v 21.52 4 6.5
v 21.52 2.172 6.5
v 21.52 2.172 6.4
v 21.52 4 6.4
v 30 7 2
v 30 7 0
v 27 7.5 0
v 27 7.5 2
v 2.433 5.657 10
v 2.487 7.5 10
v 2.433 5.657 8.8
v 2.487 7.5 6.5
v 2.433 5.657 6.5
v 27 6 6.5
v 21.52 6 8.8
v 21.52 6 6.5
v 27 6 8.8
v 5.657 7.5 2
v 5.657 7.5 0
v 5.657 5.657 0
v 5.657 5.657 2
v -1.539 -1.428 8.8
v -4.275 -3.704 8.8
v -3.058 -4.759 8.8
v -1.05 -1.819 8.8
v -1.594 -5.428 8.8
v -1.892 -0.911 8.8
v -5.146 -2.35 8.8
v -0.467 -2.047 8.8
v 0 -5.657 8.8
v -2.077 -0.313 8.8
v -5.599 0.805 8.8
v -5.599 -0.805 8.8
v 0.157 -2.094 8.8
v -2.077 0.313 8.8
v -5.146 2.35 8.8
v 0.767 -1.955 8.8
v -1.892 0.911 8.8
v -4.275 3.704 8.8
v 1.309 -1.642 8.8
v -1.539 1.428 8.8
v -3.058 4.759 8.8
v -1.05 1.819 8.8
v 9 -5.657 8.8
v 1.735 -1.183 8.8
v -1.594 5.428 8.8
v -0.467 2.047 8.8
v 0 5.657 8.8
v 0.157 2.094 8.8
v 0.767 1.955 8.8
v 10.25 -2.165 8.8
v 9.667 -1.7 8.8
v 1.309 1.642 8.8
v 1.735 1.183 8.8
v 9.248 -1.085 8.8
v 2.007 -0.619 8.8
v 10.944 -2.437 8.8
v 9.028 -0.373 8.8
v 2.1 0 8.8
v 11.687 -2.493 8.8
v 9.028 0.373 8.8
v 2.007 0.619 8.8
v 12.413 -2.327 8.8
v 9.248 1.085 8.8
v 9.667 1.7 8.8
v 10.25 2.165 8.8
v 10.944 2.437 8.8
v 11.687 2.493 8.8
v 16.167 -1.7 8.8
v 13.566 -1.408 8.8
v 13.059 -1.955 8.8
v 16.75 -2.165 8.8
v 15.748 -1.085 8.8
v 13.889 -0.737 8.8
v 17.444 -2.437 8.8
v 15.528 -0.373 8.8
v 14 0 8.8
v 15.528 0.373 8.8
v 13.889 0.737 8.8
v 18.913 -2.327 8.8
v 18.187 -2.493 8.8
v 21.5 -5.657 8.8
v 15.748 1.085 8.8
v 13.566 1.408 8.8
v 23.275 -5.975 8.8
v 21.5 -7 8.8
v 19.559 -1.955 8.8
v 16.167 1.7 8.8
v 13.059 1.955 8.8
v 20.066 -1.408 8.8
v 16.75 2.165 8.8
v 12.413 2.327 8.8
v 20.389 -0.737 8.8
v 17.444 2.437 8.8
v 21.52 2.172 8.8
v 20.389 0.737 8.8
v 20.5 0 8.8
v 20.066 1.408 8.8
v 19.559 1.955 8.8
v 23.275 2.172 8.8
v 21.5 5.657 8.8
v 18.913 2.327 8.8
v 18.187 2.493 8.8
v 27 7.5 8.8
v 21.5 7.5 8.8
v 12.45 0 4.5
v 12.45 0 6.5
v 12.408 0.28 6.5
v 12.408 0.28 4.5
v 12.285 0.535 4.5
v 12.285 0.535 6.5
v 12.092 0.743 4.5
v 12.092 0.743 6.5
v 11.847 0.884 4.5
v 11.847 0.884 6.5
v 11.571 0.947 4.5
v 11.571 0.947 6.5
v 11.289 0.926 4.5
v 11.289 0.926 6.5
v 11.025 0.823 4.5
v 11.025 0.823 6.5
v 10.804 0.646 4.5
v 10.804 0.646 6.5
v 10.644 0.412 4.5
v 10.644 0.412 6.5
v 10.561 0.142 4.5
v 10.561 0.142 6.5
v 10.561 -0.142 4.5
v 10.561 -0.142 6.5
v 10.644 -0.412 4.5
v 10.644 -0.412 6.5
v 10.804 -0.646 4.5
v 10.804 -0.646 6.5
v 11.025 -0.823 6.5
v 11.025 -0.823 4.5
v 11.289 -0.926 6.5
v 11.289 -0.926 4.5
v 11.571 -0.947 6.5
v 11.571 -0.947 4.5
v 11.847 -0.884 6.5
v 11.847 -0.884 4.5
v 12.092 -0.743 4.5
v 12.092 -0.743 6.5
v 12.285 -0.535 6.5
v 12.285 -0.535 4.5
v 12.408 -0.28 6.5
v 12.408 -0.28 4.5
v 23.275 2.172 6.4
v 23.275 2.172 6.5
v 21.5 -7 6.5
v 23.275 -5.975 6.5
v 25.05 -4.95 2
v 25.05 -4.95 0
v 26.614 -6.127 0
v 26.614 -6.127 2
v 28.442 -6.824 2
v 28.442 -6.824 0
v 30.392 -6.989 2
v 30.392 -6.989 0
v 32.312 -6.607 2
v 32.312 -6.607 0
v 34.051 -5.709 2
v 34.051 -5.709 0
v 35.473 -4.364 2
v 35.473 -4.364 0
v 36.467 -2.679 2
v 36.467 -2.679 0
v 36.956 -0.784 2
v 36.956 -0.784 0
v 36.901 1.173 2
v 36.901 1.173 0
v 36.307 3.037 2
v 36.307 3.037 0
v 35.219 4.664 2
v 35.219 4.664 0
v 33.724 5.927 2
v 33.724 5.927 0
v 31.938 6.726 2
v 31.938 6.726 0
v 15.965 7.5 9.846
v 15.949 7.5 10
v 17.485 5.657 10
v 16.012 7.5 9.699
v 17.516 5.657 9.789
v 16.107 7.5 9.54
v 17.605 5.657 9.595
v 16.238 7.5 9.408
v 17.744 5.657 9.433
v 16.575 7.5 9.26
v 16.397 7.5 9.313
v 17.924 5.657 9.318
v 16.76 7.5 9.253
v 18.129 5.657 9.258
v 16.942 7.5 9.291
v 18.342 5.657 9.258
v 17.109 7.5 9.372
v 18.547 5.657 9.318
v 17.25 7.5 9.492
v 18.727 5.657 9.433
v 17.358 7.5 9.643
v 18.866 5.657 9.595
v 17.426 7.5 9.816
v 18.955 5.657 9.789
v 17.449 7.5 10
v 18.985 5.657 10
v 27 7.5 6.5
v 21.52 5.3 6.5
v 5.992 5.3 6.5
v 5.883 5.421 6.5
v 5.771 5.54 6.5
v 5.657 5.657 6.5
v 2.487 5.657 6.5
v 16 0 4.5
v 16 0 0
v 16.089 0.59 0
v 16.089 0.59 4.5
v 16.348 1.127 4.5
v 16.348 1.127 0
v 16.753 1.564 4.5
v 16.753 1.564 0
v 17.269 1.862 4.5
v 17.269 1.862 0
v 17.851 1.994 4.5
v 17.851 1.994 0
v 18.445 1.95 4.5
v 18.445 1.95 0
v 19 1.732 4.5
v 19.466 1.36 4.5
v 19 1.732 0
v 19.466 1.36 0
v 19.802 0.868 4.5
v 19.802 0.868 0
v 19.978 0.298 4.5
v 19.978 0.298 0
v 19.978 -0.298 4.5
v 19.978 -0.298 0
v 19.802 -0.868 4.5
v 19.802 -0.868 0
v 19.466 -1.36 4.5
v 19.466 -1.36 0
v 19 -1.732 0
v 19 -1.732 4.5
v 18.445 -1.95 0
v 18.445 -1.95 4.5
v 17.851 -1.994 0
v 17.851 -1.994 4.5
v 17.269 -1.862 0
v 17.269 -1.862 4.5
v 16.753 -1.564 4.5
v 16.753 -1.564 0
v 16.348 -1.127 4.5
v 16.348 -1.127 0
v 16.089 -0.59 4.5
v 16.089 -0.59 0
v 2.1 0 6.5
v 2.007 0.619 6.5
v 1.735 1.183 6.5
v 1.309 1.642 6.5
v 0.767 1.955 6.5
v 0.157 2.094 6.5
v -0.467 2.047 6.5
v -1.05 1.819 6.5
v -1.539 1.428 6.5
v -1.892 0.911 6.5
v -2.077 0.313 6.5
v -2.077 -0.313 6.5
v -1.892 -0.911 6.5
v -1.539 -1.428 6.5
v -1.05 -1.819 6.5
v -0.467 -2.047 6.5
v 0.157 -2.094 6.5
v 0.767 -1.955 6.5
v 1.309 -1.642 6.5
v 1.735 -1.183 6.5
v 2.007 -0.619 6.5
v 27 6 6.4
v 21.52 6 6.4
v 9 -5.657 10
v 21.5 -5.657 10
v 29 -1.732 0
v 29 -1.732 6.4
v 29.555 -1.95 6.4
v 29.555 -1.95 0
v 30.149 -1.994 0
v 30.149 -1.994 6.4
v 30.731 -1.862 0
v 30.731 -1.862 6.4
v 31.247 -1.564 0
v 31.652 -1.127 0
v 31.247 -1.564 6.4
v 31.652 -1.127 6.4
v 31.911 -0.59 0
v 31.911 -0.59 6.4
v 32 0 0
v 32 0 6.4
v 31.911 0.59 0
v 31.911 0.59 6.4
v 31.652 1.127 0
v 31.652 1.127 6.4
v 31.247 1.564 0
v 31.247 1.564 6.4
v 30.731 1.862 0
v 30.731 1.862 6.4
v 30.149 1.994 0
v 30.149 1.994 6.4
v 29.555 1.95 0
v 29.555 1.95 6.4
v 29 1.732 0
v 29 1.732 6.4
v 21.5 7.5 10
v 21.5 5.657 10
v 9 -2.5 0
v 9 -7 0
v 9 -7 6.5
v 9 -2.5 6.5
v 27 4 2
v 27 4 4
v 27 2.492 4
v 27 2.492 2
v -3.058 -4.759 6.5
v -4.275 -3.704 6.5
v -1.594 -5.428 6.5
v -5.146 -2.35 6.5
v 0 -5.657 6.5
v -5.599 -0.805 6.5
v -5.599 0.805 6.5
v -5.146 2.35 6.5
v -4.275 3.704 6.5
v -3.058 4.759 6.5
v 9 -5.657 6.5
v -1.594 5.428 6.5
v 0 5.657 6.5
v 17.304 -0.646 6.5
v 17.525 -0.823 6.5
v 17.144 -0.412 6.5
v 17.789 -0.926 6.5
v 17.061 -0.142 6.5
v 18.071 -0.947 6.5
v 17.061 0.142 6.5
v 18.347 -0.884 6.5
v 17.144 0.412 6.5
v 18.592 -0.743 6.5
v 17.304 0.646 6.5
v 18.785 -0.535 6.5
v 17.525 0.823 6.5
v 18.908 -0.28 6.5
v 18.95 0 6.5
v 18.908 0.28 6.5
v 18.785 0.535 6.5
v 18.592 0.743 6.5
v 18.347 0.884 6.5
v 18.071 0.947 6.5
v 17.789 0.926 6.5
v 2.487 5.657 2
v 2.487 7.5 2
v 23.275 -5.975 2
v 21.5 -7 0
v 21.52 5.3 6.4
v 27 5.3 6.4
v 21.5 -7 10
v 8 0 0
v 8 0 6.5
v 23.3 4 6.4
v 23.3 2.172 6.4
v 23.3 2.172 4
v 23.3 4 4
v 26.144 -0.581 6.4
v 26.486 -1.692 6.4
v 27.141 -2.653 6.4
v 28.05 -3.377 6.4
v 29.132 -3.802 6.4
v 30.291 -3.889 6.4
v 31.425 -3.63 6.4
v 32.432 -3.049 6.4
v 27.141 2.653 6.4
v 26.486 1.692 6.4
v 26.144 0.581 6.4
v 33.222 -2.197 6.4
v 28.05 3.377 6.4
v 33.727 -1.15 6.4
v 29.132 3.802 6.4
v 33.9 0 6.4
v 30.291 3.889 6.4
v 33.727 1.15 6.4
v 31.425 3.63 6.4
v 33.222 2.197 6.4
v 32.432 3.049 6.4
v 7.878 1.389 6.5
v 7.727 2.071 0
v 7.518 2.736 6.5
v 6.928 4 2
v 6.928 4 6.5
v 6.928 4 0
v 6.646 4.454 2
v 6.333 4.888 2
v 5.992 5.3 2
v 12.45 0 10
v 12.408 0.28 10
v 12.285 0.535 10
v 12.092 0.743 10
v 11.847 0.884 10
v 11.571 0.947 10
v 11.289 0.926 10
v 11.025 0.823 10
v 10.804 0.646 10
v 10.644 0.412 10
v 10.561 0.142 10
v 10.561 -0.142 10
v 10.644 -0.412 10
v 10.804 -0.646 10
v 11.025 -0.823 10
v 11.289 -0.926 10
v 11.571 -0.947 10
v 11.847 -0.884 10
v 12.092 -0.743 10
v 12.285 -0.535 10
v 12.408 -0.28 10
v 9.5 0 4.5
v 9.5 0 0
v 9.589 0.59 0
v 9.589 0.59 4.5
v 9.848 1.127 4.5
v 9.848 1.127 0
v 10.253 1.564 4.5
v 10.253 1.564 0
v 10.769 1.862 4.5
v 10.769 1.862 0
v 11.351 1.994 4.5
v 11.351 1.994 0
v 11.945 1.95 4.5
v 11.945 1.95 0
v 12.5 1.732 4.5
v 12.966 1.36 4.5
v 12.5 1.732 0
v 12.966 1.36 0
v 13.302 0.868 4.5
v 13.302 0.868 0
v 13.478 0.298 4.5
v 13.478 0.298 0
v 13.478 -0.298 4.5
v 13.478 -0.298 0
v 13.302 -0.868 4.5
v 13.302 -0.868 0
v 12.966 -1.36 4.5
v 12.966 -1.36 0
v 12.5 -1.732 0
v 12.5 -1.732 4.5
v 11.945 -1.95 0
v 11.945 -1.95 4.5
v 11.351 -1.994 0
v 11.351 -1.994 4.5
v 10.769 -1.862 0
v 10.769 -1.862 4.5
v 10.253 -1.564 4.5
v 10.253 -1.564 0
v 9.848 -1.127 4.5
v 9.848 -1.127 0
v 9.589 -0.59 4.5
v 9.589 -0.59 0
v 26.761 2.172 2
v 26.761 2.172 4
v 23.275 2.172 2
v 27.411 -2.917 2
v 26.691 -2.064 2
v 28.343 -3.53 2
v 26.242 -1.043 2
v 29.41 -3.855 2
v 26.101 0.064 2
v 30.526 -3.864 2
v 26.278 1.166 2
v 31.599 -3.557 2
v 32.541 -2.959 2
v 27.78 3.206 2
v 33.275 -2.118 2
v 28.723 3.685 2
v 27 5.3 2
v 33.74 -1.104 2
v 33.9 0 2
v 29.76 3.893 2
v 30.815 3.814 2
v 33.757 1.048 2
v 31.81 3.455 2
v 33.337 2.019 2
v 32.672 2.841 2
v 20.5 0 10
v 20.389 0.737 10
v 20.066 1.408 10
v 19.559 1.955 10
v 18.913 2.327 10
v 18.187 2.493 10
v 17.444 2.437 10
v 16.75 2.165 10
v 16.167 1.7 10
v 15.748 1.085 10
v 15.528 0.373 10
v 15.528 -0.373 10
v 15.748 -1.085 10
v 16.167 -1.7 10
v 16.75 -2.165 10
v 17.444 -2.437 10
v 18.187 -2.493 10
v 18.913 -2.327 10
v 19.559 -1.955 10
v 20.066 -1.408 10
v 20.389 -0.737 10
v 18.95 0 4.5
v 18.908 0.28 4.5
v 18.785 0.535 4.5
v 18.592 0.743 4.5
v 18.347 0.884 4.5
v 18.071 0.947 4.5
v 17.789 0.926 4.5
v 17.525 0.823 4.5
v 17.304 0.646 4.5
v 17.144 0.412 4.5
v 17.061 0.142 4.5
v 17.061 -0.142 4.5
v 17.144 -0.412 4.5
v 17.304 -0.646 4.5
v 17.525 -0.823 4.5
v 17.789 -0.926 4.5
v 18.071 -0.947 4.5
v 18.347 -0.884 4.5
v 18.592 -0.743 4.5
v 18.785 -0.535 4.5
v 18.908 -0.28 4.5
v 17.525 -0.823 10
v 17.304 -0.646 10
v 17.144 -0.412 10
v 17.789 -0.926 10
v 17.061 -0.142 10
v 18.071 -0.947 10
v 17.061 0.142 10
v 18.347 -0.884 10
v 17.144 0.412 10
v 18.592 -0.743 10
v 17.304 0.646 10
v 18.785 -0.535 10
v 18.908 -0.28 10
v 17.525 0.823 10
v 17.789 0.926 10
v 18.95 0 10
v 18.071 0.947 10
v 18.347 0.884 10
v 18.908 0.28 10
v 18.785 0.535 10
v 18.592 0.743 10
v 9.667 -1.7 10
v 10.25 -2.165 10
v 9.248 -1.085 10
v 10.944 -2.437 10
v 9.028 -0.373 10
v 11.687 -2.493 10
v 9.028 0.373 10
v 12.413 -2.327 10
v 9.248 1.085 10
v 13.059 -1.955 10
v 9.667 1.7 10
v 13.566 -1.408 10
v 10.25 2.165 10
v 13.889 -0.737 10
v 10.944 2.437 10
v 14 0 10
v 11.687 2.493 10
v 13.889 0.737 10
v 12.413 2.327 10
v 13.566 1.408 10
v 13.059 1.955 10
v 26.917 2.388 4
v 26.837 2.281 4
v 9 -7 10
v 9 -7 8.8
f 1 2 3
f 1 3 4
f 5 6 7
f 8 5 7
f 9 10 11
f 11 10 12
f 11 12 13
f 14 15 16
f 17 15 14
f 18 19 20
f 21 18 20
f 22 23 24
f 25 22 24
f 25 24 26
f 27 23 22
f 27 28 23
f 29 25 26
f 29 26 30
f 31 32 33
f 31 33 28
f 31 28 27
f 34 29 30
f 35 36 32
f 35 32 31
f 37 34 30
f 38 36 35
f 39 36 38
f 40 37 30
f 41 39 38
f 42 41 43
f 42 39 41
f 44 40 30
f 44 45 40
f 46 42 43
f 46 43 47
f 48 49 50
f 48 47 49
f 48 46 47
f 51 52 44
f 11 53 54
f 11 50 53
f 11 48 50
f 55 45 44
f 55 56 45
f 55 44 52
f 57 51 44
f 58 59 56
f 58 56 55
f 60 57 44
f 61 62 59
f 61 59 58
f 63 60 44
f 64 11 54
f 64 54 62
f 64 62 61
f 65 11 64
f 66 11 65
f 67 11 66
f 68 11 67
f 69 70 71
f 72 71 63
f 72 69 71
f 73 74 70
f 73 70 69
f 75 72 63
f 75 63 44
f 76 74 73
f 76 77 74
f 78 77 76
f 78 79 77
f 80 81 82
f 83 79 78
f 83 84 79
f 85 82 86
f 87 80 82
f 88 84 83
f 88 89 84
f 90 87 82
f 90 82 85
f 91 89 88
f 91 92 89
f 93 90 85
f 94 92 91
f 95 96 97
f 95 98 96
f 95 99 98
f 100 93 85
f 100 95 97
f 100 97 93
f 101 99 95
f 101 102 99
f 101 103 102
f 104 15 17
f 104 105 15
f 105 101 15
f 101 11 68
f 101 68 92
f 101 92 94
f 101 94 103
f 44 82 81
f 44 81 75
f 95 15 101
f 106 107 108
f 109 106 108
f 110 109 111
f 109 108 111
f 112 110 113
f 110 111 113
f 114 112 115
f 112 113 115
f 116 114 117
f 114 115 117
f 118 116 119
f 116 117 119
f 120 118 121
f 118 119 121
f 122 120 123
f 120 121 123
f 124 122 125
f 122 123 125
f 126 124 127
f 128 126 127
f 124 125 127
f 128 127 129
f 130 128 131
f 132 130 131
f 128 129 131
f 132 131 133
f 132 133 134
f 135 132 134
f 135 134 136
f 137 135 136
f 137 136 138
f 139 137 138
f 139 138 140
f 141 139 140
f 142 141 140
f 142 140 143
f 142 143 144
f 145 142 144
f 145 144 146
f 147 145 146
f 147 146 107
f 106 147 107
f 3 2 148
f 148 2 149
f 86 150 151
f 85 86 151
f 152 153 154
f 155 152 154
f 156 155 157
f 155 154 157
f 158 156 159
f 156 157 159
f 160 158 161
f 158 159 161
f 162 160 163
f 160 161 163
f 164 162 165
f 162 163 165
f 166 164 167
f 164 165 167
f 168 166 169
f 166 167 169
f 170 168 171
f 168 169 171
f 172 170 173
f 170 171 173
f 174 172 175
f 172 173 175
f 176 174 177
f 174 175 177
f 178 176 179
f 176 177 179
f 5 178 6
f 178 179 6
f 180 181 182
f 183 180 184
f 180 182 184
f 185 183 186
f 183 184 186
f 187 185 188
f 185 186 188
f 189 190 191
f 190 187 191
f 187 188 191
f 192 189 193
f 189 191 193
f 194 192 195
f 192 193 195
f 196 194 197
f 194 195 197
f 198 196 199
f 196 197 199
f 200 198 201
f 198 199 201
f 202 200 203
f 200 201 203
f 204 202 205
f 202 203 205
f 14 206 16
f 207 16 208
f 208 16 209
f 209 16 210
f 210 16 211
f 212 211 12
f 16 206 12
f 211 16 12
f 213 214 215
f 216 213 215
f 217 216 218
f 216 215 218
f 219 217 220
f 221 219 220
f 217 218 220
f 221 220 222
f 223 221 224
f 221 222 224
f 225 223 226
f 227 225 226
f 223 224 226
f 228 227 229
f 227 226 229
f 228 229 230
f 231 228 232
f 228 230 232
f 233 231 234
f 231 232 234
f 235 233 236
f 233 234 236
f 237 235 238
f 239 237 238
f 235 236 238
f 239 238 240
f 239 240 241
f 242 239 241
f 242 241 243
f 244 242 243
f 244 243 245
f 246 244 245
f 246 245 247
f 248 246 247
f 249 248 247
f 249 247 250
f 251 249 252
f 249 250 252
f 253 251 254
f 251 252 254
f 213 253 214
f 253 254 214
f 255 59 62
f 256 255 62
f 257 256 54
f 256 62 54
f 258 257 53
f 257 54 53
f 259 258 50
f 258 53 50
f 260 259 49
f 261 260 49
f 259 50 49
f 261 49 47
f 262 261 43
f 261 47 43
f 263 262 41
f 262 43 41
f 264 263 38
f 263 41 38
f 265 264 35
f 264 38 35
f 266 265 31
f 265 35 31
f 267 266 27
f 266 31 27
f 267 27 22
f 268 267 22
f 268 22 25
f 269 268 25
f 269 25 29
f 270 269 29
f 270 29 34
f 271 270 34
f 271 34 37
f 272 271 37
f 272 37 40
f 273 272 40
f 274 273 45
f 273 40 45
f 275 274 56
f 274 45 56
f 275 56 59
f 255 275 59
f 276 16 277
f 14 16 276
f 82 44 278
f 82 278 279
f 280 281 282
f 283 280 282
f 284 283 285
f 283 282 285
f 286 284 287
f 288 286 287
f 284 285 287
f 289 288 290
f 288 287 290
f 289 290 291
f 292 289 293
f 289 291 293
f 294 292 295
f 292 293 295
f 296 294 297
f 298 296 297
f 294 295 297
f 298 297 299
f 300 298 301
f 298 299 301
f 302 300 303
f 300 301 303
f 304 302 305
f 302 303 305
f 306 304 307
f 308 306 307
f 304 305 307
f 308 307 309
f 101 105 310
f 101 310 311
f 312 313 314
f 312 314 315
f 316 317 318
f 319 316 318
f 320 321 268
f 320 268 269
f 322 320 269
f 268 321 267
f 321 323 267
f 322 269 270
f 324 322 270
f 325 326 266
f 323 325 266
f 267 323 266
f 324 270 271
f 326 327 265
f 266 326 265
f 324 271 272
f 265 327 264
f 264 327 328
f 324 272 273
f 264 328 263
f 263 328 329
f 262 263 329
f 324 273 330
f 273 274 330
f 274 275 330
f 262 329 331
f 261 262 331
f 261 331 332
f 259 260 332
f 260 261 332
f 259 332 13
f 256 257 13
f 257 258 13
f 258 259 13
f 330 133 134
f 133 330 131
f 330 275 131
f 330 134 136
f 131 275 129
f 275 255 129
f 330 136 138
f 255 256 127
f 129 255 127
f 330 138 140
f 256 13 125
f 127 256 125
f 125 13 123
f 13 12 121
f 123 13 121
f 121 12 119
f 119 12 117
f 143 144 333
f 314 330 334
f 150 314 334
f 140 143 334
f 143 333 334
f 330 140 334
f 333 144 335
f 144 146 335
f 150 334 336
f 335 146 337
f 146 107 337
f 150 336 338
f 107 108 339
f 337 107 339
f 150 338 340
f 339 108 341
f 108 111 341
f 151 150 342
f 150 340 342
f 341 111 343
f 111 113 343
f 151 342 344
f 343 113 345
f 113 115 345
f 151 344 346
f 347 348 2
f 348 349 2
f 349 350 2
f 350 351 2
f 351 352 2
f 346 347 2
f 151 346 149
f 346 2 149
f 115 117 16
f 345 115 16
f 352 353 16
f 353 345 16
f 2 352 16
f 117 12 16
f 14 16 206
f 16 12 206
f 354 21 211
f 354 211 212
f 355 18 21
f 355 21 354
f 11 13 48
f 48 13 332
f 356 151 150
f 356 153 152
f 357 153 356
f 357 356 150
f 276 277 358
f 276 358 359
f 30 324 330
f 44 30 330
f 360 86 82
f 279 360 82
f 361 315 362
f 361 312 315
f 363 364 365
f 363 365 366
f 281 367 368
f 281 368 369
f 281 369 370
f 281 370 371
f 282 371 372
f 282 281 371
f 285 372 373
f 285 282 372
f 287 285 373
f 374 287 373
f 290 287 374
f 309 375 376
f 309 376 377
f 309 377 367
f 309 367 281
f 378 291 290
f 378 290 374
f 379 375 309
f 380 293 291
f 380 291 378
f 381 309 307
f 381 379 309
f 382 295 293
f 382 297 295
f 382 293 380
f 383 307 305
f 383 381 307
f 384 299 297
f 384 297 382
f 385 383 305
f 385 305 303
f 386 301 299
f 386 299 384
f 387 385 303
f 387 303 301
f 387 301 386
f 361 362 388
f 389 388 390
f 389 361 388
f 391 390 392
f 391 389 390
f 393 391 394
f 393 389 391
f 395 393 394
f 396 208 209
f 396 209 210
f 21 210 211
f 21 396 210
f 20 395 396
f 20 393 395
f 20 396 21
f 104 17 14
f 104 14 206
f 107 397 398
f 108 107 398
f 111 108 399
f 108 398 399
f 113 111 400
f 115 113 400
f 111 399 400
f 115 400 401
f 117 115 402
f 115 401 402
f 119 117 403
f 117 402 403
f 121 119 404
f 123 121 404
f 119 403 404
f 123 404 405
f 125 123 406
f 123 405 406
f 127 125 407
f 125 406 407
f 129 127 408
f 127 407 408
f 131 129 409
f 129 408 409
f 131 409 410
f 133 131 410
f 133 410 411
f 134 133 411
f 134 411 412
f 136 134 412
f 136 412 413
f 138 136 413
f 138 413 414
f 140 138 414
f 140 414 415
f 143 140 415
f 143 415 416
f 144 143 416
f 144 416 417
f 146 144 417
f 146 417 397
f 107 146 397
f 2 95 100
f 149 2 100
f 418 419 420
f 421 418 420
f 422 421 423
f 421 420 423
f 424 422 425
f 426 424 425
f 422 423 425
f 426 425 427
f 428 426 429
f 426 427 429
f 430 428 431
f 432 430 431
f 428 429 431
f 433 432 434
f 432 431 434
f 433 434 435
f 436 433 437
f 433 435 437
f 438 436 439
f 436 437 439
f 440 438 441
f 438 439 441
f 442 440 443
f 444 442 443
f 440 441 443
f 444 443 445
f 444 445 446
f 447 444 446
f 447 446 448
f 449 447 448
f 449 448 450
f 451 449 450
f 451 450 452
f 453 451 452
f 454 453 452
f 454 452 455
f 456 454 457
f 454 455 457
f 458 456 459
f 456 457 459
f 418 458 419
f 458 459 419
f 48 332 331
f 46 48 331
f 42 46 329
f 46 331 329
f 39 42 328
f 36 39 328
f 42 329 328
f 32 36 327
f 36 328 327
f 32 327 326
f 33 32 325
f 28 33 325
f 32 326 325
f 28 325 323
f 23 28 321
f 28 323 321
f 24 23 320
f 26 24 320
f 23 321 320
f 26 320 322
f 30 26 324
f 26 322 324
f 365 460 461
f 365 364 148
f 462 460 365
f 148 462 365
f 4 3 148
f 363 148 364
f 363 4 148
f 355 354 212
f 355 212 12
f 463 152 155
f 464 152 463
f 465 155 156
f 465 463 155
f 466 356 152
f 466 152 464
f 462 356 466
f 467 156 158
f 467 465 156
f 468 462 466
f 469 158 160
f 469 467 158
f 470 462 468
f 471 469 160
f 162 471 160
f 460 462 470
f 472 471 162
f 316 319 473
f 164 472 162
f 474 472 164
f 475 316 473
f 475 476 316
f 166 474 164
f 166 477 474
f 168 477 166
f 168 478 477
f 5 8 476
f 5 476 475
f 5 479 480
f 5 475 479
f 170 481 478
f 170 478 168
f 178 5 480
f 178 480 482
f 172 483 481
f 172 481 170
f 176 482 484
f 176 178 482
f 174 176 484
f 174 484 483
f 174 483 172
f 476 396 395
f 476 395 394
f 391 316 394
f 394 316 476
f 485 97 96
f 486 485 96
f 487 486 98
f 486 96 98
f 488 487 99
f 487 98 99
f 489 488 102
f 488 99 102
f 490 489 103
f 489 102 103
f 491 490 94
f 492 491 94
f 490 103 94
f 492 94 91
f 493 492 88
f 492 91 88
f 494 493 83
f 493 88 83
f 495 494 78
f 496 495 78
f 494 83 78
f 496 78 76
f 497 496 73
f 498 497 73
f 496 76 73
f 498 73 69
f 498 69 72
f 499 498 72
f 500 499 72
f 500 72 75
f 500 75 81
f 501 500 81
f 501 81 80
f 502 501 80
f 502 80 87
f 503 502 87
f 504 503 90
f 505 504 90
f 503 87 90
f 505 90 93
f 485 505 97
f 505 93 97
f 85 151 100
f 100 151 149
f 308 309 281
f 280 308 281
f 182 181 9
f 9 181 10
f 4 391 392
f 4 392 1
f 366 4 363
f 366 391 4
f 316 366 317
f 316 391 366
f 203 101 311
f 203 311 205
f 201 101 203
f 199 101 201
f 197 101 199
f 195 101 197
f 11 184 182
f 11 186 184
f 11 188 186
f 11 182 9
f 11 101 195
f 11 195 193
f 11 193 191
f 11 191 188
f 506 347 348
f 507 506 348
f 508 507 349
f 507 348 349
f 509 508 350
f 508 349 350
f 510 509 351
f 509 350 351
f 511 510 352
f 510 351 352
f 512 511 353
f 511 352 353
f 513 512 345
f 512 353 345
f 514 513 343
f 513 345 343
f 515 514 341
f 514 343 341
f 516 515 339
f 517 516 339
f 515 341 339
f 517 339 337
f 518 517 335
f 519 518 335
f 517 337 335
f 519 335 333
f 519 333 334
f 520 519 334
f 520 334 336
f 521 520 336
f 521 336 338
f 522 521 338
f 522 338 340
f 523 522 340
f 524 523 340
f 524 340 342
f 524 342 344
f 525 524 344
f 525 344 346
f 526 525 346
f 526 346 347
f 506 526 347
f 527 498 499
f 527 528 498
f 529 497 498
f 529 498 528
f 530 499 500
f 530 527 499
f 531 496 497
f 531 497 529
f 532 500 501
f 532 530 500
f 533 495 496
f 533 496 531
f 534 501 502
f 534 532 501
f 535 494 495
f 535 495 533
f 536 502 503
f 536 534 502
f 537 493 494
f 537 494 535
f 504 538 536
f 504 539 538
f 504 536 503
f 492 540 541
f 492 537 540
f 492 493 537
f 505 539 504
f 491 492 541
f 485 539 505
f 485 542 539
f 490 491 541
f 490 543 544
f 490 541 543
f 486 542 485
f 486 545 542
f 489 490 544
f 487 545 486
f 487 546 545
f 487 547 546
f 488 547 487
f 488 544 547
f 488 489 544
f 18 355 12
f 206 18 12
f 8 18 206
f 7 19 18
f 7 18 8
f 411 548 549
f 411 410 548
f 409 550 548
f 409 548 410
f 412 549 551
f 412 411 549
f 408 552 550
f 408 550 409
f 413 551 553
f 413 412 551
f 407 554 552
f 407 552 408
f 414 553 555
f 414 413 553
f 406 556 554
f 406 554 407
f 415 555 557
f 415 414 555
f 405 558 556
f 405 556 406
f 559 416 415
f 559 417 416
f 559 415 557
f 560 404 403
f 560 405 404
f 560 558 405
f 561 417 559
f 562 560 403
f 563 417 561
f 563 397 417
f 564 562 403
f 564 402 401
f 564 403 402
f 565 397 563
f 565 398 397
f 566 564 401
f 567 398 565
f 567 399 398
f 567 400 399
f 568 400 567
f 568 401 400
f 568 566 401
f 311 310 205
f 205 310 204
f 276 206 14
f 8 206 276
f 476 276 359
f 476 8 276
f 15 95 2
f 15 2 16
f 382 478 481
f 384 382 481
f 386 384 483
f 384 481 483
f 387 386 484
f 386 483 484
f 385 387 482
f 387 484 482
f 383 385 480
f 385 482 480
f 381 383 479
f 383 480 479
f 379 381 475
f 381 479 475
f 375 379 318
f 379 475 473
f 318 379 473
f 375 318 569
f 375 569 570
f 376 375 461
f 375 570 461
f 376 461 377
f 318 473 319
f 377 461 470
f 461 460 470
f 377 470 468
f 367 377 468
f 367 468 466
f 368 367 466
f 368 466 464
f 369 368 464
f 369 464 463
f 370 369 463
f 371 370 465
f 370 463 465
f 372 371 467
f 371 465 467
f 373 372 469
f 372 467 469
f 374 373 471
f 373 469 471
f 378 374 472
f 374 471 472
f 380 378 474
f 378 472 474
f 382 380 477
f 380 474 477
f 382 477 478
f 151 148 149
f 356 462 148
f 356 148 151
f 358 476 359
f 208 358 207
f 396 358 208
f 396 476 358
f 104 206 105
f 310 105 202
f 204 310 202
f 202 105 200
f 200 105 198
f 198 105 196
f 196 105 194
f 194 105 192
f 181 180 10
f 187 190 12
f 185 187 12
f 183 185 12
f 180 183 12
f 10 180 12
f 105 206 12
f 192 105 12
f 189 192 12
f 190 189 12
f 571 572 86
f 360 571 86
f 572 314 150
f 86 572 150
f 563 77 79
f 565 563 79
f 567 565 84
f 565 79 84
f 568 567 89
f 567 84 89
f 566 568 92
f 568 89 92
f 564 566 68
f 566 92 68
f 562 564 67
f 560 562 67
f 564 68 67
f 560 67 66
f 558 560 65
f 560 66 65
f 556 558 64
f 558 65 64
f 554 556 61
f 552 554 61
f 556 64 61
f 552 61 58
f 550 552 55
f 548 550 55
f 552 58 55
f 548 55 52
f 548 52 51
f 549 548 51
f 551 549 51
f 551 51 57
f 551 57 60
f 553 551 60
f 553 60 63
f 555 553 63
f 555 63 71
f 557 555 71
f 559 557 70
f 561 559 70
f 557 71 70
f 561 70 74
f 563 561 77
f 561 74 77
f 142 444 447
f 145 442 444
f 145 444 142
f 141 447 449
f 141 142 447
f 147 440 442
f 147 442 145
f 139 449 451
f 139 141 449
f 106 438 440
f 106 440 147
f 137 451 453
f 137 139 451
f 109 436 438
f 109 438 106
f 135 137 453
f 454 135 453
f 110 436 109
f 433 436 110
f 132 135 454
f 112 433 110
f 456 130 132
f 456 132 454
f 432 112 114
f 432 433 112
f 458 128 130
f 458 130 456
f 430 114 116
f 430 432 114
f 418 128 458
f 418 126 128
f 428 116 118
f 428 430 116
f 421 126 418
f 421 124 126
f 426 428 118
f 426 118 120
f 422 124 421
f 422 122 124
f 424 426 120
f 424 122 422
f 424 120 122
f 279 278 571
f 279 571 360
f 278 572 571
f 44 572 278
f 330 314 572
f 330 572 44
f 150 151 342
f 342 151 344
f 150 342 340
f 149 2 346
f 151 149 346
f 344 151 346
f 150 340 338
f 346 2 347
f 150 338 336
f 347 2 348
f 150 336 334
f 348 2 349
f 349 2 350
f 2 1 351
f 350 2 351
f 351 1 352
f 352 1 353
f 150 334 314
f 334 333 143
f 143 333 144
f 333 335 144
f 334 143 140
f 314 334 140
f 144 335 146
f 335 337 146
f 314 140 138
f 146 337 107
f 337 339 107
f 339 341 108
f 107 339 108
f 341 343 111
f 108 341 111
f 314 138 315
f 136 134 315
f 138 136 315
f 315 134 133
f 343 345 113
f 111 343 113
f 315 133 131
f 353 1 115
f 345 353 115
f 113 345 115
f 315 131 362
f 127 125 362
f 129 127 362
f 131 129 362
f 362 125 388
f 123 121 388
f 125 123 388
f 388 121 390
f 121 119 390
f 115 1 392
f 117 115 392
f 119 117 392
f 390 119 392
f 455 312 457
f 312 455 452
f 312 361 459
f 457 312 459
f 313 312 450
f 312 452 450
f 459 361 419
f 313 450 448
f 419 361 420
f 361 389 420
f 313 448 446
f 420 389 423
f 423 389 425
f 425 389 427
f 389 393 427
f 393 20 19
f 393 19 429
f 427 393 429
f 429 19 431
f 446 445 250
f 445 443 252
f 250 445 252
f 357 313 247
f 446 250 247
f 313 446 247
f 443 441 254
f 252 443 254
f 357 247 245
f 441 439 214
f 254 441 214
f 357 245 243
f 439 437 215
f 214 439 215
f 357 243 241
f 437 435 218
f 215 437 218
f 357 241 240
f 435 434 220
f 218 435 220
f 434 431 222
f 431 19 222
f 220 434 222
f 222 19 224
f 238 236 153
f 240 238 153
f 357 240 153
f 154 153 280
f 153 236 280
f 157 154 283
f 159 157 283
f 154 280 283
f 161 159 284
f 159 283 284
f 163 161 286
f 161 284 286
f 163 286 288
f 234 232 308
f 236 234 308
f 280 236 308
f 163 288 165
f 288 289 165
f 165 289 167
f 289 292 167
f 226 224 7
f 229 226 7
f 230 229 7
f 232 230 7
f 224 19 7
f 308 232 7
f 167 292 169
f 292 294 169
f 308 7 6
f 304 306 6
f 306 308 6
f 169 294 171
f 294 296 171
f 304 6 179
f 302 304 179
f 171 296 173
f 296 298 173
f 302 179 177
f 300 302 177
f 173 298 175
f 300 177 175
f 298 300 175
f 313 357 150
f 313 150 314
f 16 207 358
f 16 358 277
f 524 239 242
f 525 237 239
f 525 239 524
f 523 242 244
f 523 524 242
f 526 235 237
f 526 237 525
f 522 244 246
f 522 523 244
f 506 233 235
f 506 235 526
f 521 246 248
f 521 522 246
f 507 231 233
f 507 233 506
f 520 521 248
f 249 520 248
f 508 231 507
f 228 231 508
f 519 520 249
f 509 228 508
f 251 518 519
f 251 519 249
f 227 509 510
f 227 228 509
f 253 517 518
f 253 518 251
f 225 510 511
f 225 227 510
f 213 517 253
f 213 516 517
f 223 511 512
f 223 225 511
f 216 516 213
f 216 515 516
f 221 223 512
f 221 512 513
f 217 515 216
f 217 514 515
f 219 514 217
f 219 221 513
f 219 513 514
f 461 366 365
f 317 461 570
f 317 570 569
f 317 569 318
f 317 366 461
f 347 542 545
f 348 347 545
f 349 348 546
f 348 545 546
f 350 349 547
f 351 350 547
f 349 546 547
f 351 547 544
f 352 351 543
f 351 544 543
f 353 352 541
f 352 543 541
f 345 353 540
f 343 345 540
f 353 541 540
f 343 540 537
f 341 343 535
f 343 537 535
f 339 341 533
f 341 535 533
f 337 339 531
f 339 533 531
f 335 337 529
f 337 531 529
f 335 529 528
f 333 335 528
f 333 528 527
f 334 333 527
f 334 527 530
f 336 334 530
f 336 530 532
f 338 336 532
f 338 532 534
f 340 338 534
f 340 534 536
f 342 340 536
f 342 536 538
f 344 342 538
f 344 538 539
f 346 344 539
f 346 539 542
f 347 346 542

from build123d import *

# Parameters (mm, degrees)
BOSS_EXTRUDE1_DEPTH  = 2
BOSS_EXTRUDE6_DEPTH  = 4.5
CUT_EXTRUDE6_DEPTH   = 4.5
BOSS_EXTRUDE14_DEPTH = 2.3
SKETCH32_R           = 2.1
CUT_EXTRUDE7_DEPTH   = 2.3
SKETCH33_W           = 12.5
SKETCH33_H           = 1.343145751
BOSS_EXTRUDE15_DEPTH = 1.2
SKETCH35_W           = 5.479645997
SKETCH35_H           = 3.827993755
CUT_EXTRUDE8_DEPTH   = 2.4
SKETCH36_W           = 3.7
SKETCH36_H           = 1.827993755
CUT_EXTRUDE9_DEPTH   = 2.4
SKETCH37_R           = 3.9
BOSS_EXTRUDE16_DEPTH = 4.4
CUT_EXTRUDE10_DEPTH  = 7.4
SKETCH43_R           = 2.5
BOSS_EXTRUDE17_DEPTH = 1.2
SKETCH44_R           = 0.95
CUT_EXTRUDE11_DEPTH  = 11
SKETCH45_R           = 2
CUT_EXTRUDE12_DEPTH  = 4.5
SKETCH52_R           = 0.75
CUT_EXTRUDE13_DEPTH  = 10


with BuildPart() as part:
    # Sketch3 → Boss-Extrude1 (new body)
    with BuildSketch(Plane.XY):
        with BuildLine():
            Line((8, 0), (9, -2.5))
            Line((9, -2.5), (9, -7))
            Line((9, -7), (21.5, -7))
            Line((21.5, -7), (25.050252532, -4.949747468))
            ThreePointArc((25.050252532, -4.949747468), (36.467156728, -2.678784027), (30, 7))
            Line((30, 7), (27, 7.5))
            Line((27, 7.5), (5.656854249, 7.5))
            Line((5.656854249, 7.5), (5.656854249, 5.656854249))
            ThreePointArc((5.656854249, 5.656854249), (7.39103626, 3.061467459), (8, 0))
        make_face()
    extrude(amount=BOSS_EXTRUDE1_DEPTH)

    # Sketch22 → Boss-Extrude6 (add)
    with BuildSketch(Plane.XY.offset(2)):
        with BuildLine():
            Line((5.656854249, 5.656854249), (2.486790148, 5.656854249))
            Line((2.486790148, 5.656854249), (2.486790148, 7.5))
            Line((2.486790148, 7.5), (5.656854249, 7.5))
            Line((5.656854249, 7.5), (21.5, 7.5))
            Line((21.5, 7.5), (27, 7.5))
            Line((27, 7.5), (27, 2.172006245))
            Line((27, 2.172006245), (23.275126266, 2.172006245))
            Line((23.275126266, 2.172006245), (23.275126266, -5.974873734))
            Line((23.275126266, -5.974873734), (21.5, -7))
            Line((21.5, -7), (9, -7))
            Line((9, -7), (9, -2.5))
            Line((9, -2.5), (8, 0))
            ThreePointArc((8, 0), (7.39103626, 3.061467459), (5.656854249, 5.656854249))
        make_face()
    extrude(amount=BOSS_EXTRUDE6_DEPTH)

    # Sketch26 → Cut-Extrude6 (cut)
    with BuildSketch(Plane.XY.offset(2)):
        Polygon((18.098080448, 5.3), (2.530052458, 5.3), (2.530052458, 4), (18.098080448, 4), (27, 4), (27, 5.3), align=None)
    extrude(amount=CUT_EXTRUDE6_DEPTH, mode=Mode.SUBTRACT)


with BuildPart() as body_2:
    # Sketch31 → Boss-Extrude14 (new body)
    with BuildSketch(Plane.XY.offset(6.5)):
        with BuildLine():
            Line((2.432688066, 5.656854249), (0, 5.656854249))
            ThreePointArc((0, 5.656854249), (-5.656854249, 0), (0, -5.656854249))
            Line((0, -5.656854249), (9, -5.656854249))
            Line((9, -5.656854249), (9, -7))
            Line((9, -7), (21.5, -7))
            Line((21.5, -7), (23.275126266, -5.974873734))
            Line((23.275126266, -5.974873734), (23.275126266, 2.172006245))
            Line((23.275126266, 2.172006245), (27, 2.172006245))
            Line((27, 2.172006245), (27, 7.5))
            Line((27, 7.5), (2.486790148, 7.5))
            Line((2.486790148, 7.5), (2.432688066, 5.656854249))
        make_face()
    extrude(amount=BOSS_EXTRUDE14_DEPTH)

    # Sketch32 → Cut-Extrude7 (cut)
    with BuildSketch(Plane.XY.offset(8.8)):
        Circle(SKETCH32_R)
    extrude(amount=-CUT_EXTRUDE7_DEPTH, mode=Mode.SUBTRACT)

    # Sketch33 → Boss-Extrude15 (add)
    with BuildSketch(Plane.XY.offset(8.8)):
        with Locations((15.25, -6.328427125)):
            Rectangle(SKETCH33_W, SKETCH33_H)
        Polygon((2.486790148, 7.5), (21.5, 7.5), (21.5, 5.656854249), (2.432688066, 5.656854249), align=None)
    extrude(amount=BOSS_EXTRUDE15_DEPTH)


with BuildPart() as cut_extrude8_tool:
    # Sketch35 → Cut-Extrude8 (new body)
    with BuildSketch(Plane.XY.offset(8.8)):
        with Locations((24.260177002, 4.086003123)):
            Rectangle(SKETCH35_W, SKETCH35_H)
    extrude(amount=-CUT_EXTRUDE8_DEPTH)


with BuildPart() as part_1:
    add(part.part)

    # Cut-Extrude8: cut by cut_extrude8_tool
    add(cut_extrude8_tool.part, mode=Mode.SUBTRACT)

    # Sketch36 → Cut-Extrude9 (cut)
    with BuildSketch(Plane.XY.offset(6.4)):
        with Locations((25.15, 3.086003123)):
            Rectangle(SKETCH36_W, SKETCH36_H)
    extrude(amount=-CUT_EXTRUDE9_DEPTH, mode=Mode.SUBTRACT)

    # Sketch37 → Boss-Extrude16 (add)
    with BuildSketch(Plane.XY.offset(2)):
        with Locations((30, 0)):
            Circle(SKETCH37_R)
    extrude(amount=BOSS_EXTRUDE16_DEPTH)

    # Sketch39 → Cut-Extrude10 (cut, through all)
    with BuildSketch(Plane.XY.offset(6.4)):
        with BuildLine():
            Line((29, 1.732050808), (29, -1.732050808))
            ThreePointArc((29, -1.732050808), (32, 0), (29, 1.732050808))
        make_face()
    extrude(amount=-CUT_EXTRUDE10_DEPTH, mode=Mode.SUBTRACT)


with BuildPart() as body_2_1:
    add(body_2.part)

    # Cut-Extrude8: cut by cut_extrude8_tool
    add(cut_extrude8_tool.part, mode=Mode.SUBTRACT)

    # Sketch43 → Boss-Extrude17 (add)
    with BuildSketch(Plane.XY.offset(8.8)):
        with Locations((11.5, 0)):
            Circle(SKETCH43_R)
        with Locations((18, 0)):
            Circle(SKETCH43_R)
    extrude(amount=BOSS_EXTRUDE17_DEPTH)


with BuildPart() as cut_extrude11_tool:
    # Sketch44 → Cut-Extrude11 (new body, through all)
    with BuildSketch(Plane.XY.offset(10)):
        with Locations((11.5, 0)):
            Circle(SKETCH44_R)
        with Locations((18, 0)):
            Circle(SKETCH44_R)
    extrude(amount=-CUT_EXTRUDE11_DEPTH)


with BuildPart() as part_2:
    add(part_1.part)

    # Cut-Extrude11: cut by cut_extrude11_tool
    add(cut_extrude11_tool.part, mode=Mode.SUBTRACT)

    # Sketch45 → Cut-Extrude12 (cut)
    with BuildSketch(Plane(origin=(0, 0, 0), x_dir=(-1, 0, 0), z_dir=(0, 0, -1))):
        with Locations((-11.5, 0)):
            Circle(SKETCH45_R)
        with Locations((-18, 0)):
            Circle(SKETCH45_R)
    extrude(amount=-CUT_EXTRUDE12_DEPTH, mode=Mode.SUBTRACT)


with BuildPart() as body_2_2:
    add(body_2_1.part)

    # Cut-Extrude11: cut by cut_extrude11_tool
    add(cut_extrude11_tool.part, mode=Mode.SUBTRACT)

    # Sketch52 → Cut-Extrude13 (cut, along a direction that is not the sketch's normal)
    with BuildSketch(Plane.XZ.offset(-5.656854249)):
        with Locations((18.235476819, 10)):
            Circle(SKETCH52_R)
    extrude(amount=-CUT_EXTRUDE13_DEPTH, dir=(0.640410196, -0.76803306, 0), mode=Mode.SUBTRACT)


solid = Compound([part_2.part, body_2_2.part])
